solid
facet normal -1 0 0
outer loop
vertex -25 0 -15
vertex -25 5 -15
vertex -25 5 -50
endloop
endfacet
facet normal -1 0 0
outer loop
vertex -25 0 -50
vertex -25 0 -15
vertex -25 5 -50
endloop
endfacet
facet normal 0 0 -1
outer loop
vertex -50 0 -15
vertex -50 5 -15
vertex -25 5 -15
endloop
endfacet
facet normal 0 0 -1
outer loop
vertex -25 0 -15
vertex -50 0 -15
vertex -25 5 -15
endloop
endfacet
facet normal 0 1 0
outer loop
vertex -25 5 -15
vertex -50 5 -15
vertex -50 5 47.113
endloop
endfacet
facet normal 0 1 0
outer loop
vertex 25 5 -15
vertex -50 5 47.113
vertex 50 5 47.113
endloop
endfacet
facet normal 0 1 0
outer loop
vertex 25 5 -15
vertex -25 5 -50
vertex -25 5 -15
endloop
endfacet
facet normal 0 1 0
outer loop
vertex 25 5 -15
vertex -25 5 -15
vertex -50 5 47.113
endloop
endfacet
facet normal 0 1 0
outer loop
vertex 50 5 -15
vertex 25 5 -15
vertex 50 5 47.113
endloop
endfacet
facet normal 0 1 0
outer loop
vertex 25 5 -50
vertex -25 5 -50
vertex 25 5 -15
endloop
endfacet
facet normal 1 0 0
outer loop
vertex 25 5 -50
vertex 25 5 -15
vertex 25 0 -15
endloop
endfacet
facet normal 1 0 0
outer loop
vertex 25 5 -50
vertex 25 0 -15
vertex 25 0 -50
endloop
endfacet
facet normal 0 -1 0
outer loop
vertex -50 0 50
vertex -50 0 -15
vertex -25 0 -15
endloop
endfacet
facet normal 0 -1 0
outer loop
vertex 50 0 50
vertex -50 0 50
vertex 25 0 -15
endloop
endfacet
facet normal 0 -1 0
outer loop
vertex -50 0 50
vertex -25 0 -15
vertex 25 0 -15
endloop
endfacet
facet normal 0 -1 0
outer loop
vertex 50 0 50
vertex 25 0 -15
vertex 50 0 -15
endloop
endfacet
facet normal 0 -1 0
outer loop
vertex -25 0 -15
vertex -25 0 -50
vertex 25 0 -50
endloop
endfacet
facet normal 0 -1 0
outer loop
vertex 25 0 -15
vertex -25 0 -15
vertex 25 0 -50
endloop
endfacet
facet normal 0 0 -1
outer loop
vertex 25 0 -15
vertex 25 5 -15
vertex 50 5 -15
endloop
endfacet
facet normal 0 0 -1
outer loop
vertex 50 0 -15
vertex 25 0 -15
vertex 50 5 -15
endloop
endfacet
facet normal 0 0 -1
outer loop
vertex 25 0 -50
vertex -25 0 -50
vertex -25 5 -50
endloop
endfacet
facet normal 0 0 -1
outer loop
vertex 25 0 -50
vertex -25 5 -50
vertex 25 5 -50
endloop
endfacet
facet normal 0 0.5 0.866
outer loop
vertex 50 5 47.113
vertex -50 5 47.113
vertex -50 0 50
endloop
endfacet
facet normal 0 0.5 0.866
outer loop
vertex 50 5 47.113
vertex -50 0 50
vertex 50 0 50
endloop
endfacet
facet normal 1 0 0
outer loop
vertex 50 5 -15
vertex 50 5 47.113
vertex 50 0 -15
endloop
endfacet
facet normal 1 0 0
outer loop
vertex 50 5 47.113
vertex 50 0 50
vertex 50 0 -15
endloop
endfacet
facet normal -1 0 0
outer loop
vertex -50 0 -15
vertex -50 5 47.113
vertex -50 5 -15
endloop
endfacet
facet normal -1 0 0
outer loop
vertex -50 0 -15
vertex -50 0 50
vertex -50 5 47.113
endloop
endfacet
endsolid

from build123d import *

# Parameters (mm, degrees)
CROQUIS1_W              = 100
CROQUIS1_H              = 100
SALIENTE_EXTRUIR1_DEPTH = 5
CHAFL_N1_SIZE2          = 2.886751346
CHAFL_N1_SIZE           = 5
CORTAR_EXTRUIR1_REACH   = 72.887
CROQUIS2_W              = 25
CROQUIS2_H              = 35


with BuildPart() as part:
    # Croquis1 → Saliente-Extruir1 (new body)
    with BuildSketch(Plane(origin=(0, 0, 0), x_dir=(1, 0, 0), z_dir=(0, 1, 0))):
        Rectangle(CROQUIS1_W, CROQUIS1_H)
    extrude(amount=SALIENTE_EXTRUIR1_DEPTH)

    # Chaflán1
    chafl_n1_edges = [part.edges().sort_by_distance(p)[0] for p in [
        (0, 5, 50),
    ]]
    chafl_n1_side = [part.faces().sort_by_distance(p)[0] for p in [
        (0, 4.942264973, 50),
    ]]
    chamfer(chafl_n1_edges, length=CHAFL_N1_SIZE - 0.0001, length2=CHAFL_N1_SIZE2 - 0.0001, reference=chafl_n1_side[0])  # a hair under: the kernel refuses the full size

    # Croquis2 → Cortar-Extruir1 (cut, up to next)
    with BuildSketch(Plane(origin=(0, 5, 0), x_dir=(1, 0, 0), z_dir=(0, 1, 0)), mode=Mode.PRIVATE) as cortar_extruir1_sk1:
        with Locations((-37.5, 32.5)):
            Rectangle(CROQUIS2_W, CROQUIS2_H)
    cortar_extruir1_tool1 = extrude(cortar_extruir1_sk1.sketch, amount=-CORTAR_EXTRUIR1_REACH, mode=Mode.PRIVATE) & part.part
    # Croquis2 → Cortar-Extruir1 (cut, up to next)
    with BuildSketch(Plane(origin=(0, 5, 0), x_dir=(1, 0, 0), z_dir=(0, 1, 0)), mode=Mode.PRIVATE) as cortar_extruir1_sk2:
        with Locations((37.5, 32.5)):
            Rectangle(CROQUIS2_W, CROQUIS2_H)
    cortar_extruir1_tool2 = extrude(cortar_extruir1_sk2.sketch, amount=-CORTAR_EXTRUIR1_REACH, mode=Mode.PRIVATE) & part.part
    add(cortar_extruir1_tool1.solids().sort_by_distance((-37.5, 5, -32.5))[0], mode=Mode.SUBTRACT)
    add(cortar_extruir1_tool2.solids().sort_by_distance((37.5, 5, -32.5))[0], mode=Mode.SUBTRACT)


solid = part.part
